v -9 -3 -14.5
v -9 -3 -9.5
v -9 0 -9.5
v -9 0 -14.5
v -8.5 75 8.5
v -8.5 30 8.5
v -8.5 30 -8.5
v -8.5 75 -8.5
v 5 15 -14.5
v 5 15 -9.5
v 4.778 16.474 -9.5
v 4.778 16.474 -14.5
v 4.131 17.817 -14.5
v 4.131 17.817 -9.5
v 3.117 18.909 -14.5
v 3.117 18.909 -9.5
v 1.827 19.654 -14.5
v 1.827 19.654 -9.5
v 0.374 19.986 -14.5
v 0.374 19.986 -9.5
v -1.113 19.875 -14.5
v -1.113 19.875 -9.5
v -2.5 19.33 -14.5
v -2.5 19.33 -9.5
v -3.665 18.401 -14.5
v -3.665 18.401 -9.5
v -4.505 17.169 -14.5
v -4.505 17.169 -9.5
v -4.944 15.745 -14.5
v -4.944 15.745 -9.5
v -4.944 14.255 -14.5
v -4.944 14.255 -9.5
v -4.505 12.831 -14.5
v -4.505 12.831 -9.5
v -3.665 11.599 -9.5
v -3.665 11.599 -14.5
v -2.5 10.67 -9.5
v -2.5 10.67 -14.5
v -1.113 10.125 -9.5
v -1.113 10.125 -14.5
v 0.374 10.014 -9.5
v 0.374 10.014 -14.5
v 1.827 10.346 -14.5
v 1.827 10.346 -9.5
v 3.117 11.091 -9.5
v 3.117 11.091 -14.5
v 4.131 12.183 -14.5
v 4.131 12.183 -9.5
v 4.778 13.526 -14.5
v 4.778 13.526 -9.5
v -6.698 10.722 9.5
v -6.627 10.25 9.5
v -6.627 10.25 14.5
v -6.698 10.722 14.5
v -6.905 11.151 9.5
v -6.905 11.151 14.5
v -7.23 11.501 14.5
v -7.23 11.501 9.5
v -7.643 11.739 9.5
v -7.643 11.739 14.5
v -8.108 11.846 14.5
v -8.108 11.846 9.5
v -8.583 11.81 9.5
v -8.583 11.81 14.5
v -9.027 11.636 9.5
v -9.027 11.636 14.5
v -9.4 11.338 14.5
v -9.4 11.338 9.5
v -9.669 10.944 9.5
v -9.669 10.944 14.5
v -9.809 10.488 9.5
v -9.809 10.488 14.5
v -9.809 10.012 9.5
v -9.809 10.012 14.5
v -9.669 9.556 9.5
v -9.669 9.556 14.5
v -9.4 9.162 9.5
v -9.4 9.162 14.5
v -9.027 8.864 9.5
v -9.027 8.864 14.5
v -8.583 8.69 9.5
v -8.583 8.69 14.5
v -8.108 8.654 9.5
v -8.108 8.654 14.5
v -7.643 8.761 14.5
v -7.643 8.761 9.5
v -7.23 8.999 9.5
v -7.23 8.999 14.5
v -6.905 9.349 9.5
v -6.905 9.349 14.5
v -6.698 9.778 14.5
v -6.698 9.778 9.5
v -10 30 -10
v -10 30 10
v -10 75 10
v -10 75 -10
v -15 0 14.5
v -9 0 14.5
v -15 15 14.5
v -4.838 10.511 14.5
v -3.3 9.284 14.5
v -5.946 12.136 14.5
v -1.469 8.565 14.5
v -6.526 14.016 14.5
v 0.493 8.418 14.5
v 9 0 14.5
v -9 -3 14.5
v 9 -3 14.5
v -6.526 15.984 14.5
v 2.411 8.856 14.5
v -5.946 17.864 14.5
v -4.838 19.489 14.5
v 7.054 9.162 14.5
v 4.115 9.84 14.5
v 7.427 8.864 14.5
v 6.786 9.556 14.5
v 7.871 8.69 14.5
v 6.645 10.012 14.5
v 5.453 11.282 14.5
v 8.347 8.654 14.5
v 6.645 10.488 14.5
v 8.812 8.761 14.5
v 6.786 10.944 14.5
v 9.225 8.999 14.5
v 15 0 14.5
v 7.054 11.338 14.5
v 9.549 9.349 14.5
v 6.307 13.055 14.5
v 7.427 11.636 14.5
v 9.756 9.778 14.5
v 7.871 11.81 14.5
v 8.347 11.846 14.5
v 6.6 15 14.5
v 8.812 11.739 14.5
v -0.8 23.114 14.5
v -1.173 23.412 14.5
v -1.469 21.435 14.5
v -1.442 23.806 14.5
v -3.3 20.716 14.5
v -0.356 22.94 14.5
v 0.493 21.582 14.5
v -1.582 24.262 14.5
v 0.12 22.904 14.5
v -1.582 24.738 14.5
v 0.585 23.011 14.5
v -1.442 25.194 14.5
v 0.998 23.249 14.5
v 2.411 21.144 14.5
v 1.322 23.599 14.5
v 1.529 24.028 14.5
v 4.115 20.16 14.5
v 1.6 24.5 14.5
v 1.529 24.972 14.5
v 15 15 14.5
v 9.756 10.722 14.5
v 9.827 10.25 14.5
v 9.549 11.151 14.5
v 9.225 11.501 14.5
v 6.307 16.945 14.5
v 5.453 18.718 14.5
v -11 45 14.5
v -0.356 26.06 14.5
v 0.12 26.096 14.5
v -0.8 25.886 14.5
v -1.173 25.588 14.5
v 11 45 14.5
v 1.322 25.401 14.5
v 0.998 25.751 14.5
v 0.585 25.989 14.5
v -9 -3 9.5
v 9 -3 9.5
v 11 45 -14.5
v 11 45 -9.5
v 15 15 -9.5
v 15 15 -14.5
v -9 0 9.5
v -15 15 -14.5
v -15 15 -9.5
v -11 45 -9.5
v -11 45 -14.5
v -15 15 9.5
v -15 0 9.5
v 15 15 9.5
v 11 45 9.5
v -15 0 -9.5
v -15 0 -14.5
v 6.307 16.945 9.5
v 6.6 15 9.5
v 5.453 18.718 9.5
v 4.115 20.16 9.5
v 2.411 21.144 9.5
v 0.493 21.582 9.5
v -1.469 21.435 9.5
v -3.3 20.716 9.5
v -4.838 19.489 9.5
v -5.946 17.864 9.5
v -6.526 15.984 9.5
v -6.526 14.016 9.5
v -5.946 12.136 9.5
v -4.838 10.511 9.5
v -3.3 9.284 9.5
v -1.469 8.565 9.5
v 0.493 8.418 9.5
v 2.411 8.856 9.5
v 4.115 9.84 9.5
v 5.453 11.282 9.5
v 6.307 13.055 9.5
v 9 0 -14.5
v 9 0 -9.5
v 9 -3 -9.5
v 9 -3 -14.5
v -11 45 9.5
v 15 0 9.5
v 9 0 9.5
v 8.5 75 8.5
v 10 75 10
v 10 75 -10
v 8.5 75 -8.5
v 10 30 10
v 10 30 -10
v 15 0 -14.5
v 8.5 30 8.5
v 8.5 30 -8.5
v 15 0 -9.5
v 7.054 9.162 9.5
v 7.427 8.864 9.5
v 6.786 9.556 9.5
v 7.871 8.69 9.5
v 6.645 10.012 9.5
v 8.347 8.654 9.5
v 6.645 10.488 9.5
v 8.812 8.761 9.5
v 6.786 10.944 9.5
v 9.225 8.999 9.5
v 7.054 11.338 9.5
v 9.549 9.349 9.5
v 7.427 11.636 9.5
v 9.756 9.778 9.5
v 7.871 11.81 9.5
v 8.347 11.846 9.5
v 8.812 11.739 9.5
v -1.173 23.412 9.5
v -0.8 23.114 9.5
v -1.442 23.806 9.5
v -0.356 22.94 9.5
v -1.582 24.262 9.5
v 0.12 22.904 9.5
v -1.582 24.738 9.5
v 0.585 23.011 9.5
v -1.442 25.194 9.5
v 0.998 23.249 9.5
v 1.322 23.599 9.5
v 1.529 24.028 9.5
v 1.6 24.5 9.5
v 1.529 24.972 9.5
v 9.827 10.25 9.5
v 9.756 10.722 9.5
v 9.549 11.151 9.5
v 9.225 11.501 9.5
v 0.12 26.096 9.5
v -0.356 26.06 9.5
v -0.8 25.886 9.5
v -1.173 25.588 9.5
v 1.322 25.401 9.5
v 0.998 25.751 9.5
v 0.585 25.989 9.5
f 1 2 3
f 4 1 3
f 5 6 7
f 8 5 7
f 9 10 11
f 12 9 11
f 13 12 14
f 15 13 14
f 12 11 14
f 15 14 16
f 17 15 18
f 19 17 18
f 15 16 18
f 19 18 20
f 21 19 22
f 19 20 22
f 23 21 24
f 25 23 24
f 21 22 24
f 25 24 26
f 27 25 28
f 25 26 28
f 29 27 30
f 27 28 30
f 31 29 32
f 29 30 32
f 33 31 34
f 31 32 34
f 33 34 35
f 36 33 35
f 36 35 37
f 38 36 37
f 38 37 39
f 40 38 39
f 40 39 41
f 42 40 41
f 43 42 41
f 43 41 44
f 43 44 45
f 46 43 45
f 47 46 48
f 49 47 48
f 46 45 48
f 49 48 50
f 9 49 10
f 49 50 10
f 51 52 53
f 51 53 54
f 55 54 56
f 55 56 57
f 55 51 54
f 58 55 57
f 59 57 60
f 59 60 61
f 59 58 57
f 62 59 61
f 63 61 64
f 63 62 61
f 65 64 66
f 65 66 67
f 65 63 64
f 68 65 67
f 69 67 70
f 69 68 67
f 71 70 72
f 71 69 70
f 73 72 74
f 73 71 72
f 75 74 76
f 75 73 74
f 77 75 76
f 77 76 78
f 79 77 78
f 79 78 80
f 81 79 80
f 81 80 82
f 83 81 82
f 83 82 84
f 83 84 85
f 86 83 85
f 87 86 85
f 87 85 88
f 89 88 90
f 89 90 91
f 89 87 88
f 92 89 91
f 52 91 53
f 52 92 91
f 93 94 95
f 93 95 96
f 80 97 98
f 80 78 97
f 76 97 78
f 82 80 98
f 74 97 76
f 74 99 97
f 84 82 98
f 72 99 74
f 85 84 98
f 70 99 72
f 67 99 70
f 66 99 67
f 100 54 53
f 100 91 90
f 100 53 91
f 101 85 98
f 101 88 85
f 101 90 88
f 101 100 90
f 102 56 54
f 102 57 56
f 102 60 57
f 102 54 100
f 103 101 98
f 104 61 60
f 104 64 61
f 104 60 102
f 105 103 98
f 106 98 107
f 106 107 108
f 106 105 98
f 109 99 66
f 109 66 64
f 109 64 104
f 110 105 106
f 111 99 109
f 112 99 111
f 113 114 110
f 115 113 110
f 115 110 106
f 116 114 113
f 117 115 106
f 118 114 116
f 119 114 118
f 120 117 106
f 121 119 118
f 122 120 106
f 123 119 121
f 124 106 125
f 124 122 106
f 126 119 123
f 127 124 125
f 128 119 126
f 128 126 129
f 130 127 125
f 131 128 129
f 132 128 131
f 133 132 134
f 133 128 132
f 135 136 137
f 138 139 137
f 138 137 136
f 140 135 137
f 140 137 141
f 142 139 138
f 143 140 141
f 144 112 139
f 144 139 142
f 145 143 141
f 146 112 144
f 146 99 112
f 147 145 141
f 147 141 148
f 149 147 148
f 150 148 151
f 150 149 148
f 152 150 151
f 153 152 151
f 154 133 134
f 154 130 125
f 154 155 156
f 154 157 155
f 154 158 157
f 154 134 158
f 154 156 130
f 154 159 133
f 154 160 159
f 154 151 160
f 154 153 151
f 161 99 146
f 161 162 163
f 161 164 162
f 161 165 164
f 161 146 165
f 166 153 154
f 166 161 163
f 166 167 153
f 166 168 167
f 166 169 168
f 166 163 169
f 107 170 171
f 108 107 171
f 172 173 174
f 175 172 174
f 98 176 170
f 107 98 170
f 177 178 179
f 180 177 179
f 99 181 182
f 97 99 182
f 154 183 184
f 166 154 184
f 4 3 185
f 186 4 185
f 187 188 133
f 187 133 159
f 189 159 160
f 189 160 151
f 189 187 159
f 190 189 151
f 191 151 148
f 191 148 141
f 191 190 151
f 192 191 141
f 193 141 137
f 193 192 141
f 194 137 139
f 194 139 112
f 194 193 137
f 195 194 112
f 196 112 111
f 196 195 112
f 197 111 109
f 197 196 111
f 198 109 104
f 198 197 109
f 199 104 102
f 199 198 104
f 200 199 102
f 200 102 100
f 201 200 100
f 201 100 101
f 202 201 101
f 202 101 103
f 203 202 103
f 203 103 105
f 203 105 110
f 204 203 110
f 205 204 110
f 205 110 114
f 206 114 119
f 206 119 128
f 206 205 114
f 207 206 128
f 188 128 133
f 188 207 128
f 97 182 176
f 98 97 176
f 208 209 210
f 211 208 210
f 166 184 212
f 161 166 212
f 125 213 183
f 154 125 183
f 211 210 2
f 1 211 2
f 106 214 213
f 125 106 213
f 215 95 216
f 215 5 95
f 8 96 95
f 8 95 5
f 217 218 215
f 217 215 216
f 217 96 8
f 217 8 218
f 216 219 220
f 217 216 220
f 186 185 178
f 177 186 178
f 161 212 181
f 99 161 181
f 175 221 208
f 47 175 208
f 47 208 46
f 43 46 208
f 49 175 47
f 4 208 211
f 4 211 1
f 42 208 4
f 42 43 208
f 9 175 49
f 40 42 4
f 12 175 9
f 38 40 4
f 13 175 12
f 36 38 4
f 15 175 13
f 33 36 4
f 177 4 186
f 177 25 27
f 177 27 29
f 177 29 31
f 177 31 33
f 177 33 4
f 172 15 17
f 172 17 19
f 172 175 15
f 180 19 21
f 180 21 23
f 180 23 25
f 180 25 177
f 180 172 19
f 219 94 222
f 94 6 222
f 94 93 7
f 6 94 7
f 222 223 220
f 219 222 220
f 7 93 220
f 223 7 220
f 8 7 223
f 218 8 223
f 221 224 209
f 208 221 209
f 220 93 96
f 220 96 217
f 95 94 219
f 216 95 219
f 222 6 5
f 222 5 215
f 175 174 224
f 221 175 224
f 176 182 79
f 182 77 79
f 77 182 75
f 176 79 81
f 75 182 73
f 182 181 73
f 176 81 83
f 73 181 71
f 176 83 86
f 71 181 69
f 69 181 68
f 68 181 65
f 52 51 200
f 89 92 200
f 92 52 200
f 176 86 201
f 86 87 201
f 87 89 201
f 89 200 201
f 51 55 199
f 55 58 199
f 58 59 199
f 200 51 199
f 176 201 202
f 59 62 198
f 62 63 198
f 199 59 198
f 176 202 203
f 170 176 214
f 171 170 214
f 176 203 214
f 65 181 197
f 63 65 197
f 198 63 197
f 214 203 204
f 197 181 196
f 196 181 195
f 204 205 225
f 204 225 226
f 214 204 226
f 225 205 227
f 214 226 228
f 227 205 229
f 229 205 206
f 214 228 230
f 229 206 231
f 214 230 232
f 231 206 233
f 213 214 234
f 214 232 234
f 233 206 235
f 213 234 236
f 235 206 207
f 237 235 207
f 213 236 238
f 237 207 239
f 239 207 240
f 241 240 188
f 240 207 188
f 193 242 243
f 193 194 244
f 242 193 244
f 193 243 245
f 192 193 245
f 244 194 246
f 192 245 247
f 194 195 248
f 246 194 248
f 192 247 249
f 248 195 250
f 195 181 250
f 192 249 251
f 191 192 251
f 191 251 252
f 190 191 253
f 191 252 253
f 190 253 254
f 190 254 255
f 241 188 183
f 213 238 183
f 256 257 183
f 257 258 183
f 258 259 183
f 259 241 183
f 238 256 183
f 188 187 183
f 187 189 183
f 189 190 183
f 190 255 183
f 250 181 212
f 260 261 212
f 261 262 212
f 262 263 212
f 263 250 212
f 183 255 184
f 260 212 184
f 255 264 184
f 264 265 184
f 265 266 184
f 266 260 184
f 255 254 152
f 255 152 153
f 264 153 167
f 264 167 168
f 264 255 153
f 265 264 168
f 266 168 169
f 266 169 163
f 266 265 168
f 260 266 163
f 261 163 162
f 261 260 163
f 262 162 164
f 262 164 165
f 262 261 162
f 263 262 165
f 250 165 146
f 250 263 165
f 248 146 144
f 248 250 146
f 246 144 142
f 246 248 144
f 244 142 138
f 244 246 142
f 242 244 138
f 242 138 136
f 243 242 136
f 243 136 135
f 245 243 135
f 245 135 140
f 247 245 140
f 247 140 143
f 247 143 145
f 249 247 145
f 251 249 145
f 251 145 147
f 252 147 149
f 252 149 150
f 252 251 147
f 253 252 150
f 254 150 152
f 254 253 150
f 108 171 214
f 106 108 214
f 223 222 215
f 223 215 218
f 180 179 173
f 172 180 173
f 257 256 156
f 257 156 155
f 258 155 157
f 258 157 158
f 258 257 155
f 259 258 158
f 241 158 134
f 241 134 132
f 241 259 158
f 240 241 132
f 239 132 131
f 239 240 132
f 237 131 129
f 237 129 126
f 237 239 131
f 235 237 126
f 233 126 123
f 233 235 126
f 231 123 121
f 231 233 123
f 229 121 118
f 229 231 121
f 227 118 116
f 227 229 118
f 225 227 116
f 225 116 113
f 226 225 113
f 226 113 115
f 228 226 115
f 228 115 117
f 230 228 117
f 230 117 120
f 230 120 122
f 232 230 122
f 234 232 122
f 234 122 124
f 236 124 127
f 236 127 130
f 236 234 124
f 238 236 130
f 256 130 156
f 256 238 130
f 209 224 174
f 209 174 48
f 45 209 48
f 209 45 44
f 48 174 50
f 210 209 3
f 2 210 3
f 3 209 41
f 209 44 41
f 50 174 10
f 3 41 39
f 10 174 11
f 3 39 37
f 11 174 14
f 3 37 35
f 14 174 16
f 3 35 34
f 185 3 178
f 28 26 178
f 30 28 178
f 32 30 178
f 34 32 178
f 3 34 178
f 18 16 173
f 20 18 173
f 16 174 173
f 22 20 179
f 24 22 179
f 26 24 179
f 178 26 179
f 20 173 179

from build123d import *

# Parameters (mm, degrees)
SKETCH_4_R           = 6.6
SKETCH_4_R_2         = 1.6
EXTRUDE_1_DEPTH      = 5
SKETCH_7_R           = 5
EXTRUDE_2_DEPTH      = 5
EXTRUDE_3_DEPTH      = 30
EXTRUDE_3_DEPTH_BACK = 15
SKETCH_8_W           = 20
SKETCH_8_H           = 20
SKETCH_8_W_2         = 17
SKETCH_8_H_2         = 17


with BuildPart() as part:
    # ｽｹｯﾁ4 → ﾎﾞｽ - 押し出し1 (new body)
    with BuildSketch(Plane.XY.offset(9.5)):
        Polygon((-15, 0), (-9, 0), (-9, -3), (9, -3), (9, 0), (15, 0), (15, 15), (11, 45), (-11, 45), (-15, 15), align=None)
        with Locations((0, 15)):
            Circle(SKETCH_4_R, mode=Mode.SUBTRACT)
        with Locations((0, 24.5)):
            Circle(SKETCH_4_R_2, mode=Mode.SUBTRACT)
        with Locations((8.227241336, 10.25)):
            Circle(SKETCH_4_R_2, mode=Mode.SUBTRACT)
        with Locations((-8.227241336, 10.25)):
            Circle(SKETCH_4_R_2, mode=Mode.SUBTRACT)
    extrude(amount=EXTRUDE_1_DEPTH)


with BuildPart() as body_2:
    # ｽｹｯﾁ7 → ﾎﾞｽ - 押し出し2 (new body)
    with BuildSketch(Plane.XY.offset(-9.5)):
        Polygon((15, 0), (9, 0), (9, -3), (-9, -3), (-9, 0), (-15, 0), (-15, 15), (-11, 45), (11, 45), (15, 15), align=None)
        with Locations((0, 15)):
            Circle(SKETCH_7_R, mode=Mode.SUBTRACT)
    extrude(amount=-EXTRUDE_2_DEPTH)


with BuildPart() as body_3:
    # ｽｹｯﾁ8 → ﾎﾞｽ - 押し出し3 (new, two sides: drawn at the far end of the back side and taken through both)
    with BuildSketch(Plane(origin=(0, 45, 0), x_dir=(1, 0, 0), z_dir=(0, 1, 0)).offset(-EXTRUDE_3_DEPTH_BACK)):
        Rectangle(SKETCH_8_W, SKETCH_8_H)
        Rectangle(SKETCH_8_W_2, SKETCH_8_H_2, mode=Mode.SUBTRACT)
    extrude(amount=EXTRUDE_3_DEPTH + EXTRUDE_3_DEPTH_BACK)


solid = Compound([part.part, body_2.part, body_3.part])
